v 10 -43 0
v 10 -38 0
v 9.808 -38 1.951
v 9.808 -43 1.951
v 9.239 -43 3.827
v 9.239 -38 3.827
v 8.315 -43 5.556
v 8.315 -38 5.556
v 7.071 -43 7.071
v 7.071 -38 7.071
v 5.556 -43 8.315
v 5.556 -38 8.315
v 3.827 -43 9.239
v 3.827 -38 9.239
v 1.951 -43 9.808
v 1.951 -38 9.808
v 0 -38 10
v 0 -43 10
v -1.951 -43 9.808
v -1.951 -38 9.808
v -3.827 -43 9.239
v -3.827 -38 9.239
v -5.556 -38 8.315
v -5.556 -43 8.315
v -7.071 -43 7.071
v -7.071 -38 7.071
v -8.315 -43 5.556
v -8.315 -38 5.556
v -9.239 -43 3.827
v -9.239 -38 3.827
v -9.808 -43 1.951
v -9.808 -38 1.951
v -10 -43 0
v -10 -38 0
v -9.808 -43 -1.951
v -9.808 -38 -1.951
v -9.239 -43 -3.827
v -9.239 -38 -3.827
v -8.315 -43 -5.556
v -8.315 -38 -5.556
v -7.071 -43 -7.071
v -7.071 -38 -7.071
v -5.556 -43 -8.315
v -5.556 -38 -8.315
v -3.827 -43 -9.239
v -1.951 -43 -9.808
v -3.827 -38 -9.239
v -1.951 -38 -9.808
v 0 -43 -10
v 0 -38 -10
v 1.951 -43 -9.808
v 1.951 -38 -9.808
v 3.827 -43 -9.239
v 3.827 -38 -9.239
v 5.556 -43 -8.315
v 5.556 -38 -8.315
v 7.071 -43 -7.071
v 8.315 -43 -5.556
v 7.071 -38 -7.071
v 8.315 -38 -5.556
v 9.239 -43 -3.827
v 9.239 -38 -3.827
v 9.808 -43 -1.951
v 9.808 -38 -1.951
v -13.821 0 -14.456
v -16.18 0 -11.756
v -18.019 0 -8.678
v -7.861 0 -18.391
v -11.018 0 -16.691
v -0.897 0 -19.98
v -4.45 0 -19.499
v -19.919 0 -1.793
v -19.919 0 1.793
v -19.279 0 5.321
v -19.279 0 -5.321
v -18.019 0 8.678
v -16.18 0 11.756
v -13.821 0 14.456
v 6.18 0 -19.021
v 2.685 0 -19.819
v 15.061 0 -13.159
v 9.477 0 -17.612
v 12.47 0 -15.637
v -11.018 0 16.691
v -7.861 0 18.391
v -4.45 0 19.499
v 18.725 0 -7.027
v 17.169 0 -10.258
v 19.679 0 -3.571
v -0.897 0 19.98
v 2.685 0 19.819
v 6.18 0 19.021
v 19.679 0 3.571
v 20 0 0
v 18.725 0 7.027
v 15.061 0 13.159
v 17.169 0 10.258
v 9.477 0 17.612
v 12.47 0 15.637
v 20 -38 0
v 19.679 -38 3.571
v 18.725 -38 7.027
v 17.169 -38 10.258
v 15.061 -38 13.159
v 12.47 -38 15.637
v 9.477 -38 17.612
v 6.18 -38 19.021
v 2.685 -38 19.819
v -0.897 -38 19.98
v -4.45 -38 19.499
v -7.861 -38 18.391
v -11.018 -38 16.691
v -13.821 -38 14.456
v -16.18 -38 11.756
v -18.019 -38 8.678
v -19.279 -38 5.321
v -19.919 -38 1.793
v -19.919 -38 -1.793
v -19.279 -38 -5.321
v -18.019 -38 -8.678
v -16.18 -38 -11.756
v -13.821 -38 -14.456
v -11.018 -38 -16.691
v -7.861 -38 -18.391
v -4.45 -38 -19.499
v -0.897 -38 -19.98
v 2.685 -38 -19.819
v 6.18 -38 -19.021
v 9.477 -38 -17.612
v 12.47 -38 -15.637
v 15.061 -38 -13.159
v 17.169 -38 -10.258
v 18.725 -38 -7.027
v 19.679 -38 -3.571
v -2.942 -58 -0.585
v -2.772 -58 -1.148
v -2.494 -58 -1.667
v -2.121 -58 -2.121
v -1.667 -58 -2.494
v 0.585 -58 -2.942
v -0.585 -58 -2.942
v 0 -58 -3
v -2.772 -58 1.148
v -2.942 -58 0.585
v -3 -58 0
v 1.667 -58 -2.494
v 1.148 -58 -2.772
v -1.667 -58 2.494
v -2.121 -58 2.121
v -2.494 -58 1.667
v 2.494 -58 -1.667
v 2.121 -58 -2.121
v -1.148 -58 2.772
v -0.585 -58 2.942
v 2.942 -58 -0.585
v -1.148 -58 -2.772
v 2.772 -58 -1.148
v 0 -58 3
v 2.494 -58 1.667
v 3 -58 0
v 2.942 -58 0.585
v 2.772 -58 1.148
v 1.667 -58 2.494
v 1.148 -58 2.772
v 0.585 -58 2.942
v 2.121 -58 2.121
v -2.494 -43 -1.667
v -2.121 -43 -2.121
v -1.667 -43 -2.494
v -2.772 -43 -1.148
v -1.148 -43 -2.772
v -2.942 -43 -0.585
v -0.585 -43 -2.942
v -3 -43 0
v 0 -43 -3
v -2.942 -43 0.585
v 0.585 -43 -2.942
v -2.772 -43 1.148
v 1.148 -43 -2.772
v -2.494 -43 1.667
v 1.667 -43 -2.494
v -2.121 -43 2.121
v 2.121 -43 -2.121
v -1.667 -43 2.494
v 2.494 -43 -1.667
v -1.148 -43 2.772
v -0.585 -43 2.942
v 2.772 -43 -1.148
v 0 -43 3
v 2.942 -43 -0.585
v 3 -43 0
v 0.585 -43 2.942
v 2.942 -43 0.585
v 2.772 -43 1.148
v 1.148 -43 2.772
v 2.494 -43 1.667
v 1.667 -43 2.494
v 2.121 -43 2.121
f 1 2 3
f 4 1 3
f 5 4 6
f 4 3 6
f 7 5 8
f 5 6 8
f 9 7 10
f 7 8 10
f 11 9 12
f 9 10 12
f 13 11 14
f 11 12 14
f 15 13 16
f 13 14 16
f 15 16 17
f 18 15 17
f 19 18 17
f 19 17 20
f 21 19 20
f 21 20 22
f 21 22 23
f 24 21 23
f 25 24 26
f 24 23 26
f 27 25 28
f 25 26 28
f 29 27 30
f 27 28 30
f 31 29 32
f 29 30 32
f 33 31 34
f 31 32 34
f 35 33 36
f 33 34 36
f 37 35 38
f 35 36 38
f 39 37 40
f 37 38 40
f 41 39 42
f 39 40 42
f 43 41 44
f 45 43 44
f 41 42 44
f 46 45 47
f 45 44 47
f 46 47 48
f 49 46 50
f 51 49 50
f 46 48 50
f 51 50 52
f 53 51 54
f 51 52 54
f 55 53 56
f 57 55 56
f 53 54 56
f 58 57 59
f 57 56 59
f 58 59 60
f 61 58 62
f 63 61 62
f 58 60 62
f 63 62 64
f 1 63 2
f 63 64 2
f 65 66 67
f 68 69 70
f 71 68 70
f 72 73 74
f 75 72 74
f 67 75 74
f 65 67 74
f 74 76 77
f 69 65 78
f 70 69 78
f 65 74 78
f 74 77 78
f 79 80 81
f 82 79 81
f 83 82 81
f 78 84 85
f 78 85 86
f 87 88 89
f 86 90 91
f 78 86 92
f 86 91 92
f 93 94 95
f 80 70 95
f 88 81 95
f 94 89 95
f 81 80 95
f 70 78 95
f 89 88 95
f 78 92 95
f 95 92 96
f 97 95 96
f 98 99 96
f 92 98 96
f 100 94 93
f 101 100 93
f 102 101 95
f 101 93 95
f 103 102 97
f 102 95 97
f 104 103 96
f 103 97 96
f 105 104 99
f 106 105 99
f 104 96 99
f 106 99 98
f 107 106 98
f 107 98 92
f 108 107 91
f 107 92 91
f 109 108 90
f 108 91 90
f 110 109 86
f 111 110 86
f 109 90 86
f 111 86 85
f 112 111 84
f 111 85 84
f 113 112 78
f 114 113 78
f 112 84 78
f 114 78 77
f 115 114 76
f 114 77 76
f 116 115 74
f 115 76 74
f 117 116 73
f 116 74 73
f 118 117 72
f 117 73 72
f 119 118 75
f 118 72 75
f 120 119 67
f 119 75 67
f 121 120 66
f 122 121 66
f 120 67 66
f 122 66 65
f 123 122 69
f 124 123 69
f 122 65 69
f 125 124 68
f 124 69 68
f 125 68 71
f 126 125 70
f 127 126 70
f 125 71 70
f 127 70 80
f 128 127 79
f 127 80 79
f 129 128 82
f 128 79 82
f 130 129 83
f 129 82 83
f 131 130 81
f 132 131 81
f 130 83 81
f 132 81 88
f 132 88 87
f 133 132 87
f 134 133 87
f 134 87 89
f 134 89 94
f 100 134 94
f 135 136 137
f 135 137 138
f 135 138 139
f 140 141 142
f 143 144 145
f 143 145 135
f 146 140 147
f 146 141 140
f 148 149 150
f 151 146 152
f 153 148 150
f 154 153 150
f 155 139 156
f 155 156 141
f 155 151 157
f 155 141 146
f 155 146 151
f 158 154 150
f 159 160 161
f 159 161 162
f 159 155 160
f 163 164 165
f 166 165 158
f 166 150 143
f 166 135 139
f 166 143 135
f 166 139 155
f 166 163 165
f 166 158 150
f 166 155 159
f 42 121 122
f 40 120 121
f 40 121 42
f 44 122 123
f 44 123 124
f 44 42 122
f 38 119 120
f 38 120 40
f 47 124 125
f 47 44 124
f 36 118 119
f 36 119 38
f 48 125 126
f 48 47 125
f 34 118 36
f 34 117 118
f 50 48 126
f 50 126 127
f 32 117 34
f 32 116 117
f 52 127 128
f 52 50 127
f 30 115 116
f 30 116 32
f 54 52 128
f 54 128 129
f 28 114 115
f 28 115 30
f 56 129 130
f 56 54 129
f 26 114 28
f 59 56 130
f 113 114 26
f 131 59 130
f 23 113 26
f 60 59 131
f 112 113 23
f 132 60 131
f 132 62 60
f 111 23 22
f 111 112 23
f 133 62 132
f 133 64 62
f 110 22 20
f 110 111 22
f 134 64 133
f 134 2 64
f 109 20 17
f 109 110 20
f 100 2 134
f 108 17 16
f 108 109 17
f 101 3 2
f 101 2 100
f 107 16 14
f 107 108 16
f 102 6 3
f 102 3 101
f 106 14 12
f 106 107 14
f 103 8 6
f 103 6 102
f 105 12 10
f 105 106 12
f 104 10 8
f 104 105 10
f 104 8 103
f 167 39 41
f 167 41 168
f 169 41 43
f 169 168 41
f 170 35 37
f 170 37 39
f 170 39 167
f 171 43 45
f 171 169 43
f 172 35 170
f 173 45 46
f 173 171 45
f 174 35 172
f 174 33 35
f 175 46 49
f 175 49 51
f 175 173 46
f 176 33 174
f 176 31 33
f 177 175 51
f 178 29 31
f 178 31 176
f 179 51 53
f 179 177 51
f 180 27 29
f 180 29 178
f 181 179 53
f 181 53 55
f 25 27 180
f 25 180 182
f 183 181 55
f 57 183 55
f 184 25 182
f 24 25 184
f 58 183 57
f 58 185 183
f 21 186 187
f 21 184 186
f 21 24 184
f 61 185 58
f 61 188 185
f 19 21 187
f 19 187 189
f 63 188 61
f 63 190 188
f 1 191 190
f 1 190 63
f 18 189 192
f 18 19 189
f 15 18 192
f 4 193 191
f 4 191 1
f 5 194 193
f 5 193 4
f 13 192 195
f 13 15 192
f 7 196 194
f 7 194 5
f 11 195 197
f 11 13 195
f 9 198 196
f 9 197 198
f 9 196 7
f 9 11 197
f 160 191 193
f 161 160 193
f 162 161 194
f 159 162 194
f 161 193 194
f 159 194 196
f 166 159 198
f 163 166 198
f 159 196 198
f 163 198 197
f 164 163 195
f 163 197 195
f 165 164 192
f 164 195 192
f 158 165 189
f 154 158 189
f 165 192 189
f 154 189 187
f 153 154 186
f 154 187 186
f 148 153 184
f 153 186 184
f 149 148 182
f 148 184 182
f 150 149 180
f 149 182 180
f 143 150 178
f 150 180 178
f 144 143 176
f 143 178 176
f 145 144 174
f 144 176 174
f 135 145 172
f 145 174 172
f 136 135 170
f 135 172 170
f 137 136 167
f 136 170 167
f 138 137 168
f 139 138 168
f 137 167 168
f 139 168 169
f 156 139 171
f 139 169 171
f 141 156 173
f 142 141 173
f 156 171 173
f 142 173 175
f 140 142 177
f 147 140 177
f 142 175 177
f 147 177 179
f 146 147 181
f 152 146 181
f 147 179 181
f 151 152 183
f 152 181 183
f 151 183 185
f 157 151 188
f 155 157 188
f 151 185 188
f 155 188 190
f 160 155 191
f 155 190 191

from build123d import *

# Parameters (mm, degrees)
ESBO_O11_R               = 20
RESSALTO_EXTRUS_O3_DEPTH = 38
ESBO_O12_R               = 10
RESSALTO_EXTRUS_O4_DEPTH = 5
ESBO_O13_R               = 3
RESSALTO_EXTRUS_O5_DEPTH = 15


with BuildPart() as part:
    # Esboço11 → Ressalto-extrusão3 (new body)
    with BuildSketch(Plane.XZ):
        Circle(ESBO_O11_R)
    extrude(amount=RESSALTO_EXTRUS_O3_DEPTH)

    # Esboço12 → Ressalto-extrusão4 (add)
    with BuildSketch(Plane.XZ.offset(38)):
        Circle(ESBO_O12_R)
    extrude(amount=RESSALTO_EXTRUS_O4_DEPTH)

    # Esboço13 → Ressalto-extrusão5 (add)
    with BuildSketch(Plane.XZ.offset(43)):
        Circle(ESBO_O13_R)
    extrude(amount=RESSALTO_EXTRUS_O5_DEPTH)


solid = part.part
